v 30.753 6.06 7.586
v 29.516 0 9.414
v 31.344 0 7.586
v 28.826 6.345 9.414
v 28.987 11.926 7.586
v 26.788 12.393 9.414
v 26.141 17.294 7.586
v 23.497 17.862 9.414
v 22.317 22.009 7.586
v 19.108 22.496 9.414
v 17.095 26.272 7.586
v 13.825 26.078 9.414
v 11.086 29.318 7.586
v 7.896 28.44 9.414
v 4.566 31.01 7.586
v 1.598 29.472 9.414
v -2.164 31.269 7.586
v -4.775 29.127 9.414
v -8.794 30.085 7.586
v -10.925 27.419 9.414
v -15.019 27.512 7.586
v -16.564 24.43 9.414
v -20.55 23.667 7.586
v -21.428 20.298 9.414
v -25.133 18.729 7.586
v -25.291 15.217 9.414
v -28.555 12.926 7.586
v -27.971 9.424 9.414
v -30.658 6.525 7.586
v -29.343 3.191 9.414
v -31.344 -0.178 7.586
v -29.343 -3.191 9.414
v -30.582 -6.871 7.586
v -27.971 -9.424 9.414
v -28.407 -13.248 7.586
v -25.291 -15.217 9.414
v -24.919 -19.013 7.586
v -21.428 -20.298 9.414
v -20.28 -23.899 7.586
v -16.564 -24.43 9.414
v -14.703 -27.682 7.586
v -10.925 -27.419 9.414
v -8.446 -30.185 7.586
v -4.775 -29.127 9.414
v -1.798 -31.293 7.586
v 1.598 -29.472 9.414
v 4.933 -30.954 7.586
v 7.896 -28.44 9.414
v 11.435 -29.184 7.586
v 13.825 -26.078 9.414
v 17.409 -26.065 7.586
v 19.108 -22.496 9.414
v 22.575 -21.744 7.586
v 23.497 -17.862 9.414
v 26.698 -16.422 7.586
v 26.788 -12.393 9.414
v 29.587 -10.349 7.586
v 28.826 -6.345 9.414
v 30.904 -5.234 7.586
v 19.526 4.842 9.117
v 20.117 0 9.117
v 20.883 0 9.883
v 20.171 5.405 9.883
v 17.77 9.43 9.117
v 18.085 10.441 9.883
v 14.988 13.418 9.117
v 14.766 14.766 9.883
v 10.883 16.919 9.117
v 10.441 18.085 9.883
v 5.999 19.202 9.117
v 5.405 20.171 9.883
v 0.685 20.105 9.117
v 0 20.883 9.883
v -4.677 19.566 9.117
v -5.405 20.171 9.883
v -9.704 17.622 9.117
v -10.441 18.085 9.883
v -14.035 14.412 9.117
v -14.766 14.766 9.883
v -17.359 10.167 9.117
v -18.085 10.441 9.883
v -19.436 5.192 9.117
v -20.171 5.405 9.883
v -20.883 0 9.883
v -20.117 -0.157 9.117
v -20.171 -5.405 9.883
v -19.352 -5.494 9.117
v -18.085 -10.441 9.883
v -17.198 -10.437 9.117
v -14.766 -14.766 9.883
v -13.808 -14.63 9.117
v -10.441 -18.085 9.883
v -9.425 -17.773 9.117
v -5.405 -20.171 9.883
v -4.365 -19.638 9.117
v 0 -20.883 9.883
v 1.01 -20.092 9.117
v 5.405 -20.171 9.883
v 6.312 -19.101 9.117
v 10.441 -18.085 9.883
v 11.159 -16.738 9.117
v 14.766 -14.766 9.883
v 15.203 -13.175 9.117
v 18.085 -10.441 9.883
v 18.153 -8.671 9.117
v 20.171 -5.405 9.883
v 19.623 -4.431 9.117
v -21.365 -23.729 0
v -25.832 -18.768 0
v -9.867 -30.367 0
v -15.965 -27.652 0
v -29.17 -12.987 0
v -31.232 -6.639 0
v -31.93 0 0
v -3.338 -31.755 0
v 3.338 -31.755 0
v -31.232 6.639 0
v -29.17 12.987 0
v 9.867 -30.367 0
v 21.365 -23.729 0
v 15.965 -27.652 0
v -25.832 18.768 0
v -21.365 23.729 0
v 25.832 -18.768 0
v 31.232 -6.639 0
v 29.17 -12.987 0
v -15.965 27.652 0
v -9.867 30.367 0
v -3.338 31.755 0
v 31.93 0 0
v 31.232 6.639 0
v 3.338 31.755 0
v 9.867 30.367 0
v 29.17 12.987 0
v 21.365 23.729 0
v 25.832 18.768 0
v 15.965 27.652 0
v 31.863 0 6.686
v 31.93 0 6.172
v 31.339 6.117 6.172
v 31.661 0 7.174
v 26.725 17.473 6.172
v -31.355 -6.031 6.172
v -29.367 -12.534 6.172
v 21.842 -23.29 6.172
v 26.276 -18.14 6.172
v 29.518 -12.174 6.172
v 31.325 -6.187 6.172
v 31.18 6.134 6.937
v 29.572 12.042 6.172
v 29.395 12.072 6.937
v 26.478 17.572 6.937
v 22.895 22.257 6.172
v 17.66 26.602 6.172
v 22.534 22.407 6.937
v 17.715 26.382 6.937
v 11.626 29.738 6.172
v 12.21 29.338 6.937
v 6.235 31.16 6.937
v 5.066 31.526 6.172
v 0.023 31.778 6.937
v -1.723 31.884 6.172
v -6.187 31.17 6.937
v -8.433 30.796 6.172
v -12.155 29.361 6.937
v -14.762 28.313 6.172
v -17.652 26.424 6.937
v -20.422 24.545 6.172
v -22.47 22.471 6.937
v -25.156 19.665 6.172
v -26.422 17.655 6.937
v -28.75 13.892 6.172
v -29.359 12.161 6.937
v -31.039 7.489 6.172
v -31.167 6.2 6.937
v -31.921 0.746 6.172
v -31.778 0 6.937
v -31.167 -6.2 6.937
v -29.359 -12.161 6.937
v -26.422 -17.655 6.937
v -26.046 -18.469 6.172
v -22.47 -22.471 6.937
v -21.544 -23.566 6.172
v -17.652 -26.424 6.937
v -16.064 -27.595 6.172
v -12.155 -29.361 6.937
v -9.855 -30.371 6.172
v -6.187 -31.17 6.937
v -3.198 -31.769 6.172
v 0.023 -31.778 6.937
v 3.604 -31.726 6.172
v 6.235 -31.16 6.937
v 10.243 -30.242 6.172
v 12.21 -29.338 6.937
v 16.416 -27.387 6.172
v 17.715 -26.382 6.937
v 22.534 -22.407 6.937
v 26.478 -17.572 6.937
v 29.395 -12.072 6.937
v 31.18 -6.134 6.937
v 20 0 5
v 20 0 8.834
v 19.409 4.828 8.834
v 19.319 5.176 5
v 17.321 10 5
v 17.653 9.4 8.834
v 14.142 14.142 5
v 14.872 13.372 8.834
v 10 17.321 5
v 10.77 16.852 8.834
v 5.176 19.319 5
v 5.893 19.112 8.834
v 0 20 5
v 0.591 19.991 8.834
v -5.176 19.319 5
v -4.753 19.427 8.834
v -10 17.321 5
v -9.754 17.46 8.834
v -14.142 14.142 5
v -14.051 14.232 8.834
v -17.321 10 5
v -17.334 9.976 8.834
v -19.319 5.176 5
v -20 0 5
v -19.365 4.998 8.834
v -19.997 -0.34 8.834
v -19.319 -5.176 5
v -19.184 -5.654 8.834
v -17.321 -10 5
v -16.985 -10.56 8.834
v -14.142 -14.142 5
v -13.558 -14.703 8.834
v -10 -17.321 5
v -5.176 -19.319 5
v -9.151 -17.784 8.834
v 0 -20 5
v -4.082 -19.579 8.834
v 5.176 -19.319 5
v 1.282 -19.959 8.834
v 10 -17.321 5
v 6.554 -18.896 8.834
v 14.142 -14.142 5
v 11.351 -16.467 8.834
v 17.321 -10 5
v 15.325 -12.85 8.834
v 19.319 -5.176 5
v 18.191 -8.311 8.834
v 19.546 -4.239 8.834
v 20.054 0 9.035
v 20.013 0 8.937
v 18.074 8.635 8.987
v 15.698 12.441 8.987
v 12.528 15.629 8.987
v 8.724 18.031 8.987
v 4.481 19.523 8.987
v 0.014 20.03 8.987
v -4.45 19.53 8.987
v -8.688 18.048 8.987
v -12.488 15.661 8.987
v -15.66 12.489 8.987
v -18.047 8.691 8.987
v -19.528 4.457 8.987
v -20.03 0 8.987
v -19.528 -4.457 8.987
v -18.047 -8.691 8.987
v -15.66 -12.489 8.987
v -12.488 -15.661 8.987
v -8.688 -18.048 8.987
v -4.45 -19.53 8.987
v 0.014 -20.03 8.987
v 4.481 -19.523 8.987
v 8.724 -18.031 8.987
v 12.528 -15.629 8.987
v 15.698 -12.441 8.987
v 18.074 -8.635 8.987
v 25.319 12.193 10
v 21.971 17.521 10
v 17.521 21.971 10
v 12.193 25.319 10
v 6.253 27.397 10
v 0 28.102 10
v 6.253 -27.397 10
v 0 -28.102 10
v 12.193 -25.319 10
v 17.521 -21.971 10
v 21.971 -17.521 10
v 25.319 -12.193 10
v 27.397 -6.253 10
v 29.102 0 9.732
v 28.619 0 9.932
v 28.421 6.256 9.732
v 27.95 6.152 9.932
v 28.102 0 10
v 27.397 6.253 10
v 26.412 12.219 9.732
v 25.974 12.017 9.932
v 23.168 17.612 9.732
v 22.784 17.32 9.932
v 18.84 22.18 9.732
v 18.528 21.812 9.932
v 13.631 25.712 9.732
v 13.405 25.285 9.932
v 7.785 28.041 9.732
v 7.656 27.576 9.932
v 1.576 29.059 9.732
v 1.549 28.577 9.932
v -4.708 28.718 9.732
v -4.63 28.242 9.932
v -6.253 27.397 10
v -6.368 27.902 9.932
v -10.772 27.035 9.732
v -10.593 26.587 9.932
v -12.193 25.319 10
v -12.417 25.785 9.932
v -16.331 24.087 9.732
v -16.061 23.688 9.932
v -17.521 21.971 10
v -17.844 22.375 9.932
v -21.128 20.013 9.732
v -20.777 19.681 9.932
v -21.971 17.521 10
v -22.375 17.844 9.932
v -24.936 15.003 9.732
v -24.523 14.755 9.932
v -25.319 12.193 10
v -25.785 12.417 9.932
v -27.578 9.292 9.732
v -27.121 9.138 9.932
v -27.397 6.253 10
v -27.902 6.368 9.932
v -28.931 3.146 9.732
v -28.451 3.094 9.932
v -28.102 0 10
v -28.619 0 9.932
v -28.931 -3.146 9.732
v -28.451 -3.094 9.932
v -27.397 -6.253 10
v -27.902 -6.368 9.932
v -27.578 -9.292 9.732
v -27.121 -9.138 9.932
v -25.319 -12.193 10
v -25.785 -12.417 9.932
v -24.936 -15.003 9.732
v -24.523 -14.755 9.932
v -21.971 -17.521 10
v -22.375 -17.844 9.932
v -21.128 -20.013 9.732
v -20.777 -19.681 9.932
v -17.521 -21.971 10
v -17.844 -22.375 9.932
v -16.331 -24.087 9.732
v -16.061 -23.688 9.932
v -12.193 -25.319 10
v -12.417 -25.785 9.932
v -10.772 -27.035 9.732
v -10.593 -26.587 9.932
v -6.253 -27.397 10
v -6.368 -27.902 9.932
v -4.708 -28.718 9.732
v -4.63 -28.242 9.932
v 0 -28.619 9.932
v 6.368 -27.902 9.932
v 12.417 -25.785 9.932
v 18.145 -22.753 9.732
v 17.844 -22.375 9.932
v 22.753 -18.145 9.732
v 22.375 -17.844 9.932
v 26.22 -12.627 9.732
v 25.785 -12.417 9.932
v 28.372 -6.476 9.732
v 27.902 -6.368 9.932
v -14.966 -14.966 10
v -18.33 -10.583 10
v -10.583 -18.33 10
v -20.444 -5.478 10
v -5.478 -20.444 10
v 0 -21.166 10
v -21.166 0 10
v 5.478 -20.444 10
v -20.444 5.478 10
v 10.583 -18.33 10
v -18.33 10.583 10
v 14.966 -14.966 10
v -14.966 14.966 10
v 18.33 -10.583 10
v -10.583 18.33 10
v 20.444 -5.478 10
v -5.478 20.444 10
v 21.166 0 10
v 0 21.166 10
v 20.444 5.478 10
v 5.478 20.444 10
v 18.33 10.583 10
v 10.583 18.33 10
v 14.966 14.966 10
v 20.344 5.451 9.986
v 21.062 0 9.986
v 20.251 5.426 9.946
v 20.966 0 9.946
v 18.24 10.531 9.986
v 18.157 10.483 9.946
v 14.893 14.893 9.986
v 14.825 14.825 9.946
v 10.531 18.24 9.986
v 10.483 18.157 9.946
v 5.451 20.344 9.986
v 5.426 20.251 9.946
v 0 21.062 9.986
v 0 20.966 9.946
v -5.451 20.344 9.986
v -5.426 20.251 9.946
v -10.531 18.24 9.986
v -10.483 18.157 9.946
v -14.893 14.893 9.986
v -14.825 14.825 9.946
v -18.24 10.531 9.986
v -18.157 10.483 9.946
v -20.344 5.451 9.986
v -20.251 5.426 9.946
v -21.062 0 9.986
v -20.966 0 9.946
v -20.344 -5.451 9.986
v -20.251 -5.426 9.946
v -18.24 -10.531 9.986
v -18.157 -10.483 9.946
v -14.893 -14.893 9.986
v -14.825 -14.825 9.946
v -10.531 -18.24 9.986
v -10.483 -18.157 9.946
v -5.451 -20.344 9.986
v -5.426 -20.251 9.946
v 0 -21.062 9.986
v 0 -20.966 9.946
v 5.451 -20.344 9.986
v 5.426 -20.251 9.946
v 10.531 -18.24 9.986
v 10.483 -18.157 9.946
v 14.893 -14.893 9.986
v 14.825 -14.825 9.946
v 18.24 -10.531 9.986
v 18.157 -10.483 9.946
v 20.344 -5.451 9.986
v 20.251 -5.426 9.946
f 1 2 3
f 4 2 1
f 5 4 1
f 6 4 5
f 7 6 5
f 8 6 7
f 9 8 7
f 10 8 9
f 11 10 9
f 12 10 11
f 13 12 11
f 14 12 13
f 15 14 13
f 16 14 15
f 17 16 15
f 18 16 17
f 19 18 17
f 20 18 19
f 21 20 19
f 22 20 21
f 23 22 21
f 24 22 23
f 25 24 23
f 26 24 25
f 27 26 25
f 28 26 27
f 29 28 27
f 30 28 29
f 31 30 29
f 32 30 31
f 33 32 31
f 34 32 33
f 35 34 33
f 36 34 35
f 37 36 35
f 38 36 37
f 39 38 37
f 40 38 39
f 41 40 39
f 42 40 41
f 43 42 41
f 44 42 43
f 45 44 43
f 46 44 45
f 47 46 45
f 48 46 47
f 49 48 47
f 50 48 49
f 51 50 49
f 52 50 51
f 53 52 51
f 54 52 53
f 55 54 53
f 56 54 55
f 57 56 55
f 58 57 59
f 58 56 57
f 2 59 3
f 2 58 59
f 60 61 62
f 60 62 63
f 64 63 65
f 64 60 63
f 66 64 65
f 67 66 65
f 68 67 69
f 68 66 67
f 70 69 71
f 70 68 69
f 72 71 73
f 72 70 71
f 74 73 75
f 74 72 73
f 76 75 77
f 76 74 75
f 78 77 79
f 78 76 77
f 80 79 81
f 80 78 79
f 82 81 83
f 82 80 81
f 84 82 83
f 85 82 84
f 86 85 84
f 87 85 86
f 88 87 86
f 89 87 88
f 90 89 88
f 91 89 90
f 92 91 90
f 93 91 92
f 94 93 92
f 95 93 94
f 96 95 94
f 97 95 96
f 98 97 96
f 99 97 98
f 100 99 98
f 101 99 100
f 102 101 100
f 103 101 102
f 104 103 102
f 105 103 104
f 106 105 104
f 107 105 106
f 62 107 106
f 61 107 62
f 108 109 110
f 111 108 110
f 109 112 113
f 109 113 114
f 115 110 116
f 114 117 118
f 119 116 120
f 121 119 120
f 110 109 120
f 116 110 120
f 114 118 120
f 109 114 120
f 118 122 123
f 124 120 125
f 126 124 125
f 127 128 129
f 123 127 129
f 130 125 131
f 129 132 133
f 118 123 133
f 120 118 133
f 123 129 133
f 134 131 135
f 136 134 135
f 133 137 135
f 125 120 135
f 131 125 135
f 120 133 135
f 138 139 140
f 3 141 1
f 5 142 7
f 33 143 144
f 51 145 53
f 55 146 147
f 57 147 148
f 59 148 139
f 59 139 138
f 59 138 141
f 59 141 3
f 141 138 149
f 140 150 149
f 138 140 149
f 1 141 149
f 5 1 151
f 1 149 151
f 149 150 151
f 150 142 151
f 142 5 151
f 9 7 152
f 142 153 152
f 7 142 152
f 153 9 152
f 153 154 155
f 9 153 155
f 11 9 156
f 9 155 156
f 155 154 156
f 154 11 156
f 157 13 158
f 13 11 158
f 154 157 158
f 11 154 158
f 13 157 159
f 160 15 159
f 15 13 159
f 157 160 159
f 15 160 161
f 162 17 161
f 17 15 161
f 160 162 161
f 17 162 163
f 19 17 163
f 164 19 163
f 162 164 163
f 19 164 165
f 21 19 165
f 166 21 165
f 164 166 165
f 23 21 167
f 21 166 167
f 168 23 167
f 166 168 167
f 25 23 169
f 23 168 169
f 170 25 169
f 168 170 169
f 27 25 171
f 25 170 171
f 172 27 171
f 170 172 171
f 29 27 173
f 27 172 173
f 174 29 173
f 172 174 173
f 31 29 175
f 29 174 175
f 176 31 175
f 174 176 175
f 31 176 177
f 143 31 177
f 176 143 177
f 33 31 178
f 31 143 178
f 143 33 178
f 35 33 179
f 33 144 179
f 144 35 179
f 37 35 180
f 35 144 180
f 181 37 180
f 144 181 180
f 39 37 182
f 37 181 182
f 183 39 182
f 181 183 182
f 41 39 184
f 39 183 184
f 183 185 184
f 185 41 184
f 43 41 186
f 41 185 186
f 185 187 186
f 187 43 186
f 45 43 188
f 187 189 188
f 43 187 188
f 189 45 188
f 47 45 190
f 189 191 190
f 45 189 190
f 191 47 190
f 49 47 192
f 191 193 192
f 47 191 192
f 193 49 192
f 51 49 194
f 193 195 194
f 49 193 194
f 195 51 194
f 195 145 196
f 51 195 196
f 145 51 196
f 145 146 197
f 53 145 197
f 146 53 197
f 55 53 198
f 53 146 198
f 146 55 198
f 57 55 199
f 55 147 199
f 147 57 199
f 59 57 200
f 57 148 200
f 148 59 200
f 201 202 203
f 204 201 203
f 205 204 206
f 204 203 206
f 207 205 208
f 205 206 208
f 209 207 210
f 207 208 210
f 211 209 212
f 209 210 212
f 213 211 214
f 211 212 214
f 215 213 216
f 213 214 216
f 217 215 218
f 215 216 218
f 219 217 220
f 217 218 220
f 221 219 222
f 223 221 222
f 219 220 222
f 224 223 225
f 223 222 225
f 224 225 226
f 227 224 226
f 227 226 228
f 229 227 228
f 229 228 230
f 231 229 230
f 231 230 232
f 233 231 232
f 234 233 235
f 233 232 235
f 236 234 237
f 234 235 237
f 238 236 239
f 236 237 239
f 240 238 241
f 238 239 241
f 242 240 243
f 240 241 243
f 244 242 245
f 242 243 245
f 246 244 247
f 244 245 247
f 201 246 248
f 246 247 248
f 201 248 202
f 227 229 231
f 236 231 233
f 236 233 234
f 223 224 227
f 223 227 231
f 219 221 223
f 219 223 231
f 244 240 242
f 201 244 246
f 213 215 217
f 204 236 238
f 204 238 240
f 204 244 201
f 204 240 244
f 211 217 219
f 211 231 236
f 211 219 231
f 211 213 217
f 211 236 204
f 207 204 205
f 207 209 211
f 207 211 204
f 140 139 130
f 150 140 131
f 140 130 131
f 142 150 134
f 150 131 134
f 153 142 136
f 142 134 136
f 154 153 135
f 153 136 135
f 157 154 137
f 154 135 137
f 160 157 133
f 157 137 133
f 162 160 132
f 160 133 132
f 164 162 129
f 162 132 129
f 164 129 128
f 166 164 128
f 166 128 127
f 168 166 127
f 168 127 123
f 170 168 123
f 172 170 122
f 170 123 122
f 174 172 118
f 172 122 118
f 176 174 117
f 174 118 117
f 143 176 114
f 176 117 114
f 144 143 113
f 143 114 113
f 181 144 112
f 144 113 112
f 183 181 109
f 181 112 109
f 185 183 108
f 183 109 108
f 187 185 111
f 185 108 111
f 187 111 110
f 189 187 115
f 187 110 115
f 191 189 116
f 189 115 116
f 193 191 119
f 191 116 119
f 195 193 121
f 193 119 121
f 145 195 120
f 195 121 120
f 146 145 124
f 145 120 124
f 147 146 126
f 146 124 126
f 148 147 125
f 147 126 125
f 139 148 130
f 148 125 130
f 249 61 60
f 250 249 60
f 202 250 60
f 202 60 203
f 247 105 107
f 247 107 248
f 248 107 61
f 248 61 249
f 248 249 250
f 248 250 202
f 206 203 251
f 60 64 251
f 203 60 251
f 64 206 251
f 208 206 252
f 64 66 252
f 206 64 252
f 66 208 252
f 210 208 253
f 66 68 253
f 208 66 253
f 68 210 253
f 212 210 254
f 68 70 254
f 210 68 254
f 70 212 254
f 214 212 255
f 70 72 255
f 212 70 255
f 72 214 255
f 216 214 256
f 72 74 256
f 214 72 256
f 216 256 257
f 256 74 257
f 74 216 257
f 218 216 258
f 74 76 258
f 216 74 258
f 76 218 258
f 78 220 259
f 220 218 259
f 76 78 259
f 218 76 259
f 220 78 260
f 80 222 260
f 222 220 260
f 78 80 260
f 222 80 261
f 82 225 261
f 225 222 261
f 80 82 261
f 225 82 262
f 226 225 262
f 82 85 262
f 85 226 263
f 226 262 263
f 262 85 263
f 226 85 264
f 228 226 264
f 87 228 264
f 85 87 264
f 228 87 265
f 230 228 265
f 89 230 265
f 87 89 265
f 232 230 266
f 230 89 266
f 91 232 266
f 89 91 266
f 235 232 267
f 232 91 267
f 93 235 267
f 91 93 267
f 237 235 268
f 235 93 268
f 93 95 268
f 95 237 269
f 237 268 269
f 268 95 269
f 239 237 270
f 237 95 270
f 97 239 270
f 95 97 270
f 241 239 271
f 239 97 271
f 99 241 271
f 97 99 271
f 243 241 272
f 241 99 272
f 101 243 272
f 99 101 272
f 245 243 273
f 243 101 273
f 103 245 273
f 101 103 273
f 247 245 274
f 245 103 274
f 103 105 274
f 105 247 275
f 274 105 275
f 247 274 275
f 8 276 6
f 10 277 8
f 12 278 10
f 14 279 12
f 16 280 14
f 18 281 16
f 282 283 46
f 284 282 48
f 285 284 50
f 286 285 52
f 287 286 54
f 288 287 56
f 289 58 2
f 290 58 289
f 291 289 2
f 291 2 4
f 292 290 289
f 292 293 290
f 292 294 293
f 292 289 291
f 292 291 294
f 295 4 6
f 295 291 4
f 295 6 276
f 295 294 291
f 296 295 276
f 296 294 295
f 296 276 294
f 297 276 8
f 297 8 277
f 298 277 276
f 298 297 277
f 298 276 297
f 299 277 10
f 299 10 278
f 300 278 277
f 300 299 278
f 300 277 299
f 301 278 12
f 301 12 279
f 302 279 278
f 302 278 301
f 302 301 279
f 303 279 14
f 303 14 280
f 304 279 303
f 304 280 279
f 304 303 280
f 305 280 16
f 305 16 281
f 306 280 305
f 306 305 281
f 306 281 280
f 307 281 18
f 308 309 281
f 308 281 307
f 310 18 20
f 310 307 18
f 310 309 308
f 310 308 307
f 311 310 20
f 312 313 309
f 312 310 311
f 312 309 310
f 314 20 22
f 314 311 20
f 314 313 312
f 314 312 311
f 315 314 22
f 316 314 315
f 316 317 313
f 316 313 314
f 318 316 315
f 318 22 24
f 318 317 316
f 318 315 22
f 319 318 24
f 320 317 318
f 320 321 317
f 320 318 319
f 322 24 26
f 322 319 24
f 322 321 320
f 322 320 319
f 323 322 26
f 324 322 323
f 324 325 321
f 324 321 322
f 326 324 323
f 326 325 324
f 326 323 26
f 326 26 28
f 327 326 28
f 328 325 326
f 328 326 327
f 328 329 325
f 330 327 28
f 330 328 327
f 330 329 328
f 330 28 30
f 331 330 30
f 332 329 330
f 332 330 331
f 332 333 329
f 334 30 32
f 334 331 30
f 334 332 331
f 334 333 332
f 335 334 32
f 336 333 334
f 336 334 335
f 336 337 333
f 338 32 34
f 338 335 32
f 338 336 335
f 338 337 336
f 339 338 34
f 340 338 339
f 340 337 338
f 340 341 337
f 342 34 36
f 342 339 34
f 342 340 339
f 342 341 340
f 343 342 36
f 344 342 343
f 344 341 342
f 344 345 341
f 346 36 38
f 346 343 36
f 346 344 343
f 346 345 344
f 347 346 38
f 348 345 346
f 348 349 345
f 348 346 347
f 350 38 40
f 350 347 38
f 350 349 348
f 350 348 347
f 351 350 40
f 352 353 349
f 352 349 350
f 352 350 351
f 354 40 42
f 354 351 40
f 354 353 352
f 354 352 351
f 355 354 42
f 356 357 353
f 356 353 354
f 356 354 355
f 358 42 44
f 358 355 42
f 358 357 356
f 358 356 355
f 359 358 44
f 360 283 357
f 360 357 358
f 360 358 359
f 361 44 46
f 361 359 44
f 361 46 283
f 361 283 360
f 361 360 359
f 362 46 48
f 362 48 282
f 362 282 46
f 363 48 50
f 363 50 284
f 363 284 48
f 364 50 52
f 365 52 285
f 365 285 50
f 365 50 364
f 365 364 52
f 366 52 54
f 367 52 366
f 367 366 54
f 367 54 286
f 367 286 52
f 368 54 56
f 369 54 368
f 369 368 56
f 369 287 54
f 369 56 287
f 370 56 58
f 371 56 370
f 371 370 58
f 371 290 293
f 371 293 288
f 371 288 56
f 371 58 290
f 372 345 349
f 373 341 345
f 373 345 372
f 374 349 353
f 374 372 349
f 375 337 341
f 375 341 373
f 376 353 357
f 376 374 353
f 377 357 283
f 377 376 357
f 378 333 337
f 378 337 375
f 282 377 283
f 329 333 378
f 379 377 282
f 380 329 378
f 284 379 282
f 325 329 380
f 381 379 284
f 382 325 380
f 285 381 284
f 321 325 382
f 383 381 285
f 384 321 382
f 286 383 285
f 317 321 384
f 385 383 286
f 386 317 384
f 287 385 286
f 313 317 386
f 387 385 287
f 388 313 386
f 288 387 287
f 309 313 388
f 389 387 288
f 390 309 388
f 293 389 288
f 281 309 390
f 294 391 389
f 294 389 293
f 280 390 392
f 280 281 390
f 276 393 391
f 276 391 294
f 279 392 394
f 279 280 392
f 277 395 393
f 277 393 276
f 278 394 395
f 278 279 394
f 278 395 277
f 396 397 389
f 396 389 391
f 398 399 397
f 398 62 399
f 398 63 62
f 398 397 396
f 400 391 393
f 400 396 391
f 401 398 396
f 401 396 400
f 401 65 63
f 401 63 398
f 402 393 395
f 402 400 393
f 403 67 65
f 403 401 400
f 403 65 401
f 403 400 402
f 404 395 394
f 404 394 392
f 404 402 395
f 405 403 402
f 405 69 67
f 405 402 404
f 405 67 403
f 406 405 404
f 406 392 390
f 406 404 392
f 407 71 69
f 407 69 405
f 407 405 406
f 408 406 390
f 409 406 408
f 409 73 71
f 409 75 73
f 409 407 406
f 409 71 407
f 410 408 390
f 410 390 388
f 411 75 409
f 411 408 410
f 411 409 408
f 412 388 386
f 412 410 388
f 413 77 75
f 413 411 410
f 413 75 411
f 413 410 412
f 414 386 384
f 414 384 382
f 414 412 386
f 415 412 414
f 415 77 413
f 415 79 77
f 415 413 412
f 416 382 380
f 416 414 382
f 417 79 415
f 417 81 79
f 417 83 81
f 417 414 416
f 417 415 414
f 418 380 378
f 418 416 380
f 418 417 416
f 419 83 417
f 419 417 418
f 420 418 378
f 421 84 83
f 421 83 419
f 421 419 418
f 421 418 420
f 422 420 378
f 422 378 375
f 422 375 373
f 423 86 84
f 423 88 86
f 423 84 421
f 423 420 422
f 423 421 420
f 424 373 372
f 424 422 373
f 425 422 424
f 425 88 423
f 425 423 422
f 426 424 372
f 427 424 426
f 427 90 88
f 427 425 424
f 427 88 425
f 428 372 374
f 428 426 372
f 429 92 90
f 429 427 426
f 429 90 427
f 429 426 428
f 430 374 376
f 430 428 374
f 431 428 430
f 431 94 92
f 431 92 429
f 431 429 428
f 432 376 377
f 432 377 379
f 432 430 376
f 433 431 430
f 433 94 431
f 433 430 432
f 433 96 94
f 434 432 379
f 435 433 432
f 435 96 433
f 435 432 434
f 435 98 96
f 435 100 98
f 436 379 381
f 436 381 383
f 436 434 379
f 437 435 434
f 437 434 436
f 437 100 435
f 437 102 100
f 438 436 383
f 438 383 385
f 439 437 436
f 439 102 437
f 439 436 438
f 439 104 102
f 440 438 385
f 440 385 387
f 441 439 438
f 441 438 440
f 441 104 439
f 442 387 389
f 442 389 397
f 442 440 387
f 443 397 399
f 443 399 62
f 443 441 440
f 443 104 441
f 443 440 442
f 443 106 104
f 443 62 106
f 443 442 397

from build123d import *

# Parameters (mm, degrees)
SKETCH1_R           = 31.93
BOSS_EXTRUDE1_DEPTH = 10
CHAMFER1_SIZE       = 3
FILLET1_R           = 2
SKETCH2_R           = 20
CUT_EXTRUDE1_DEPTH  = 5
CHAMFER2_SIZE       = 1
FILLET2_R           = 0.4


with BuildPart() as part:
    # Sketch1 → Boss-Extrude1 (new body)
    with BuildSketch(Plane.XY):
        Circle(SKETCH1_R)
    extrude(amount=BOSS_EXTRUDE1_DEPTH)

    # Chamfer1
    chamfer1_edges = [part.edges().sort_by_distance(p)[0] for p in [
        (-31.93, 0, 10),
    ]]
    chamfer(chamfer1_edges, length=CHAMFER1_SIZE)

    # Fillet1
    fillet1_edges = [part.edges().sort_by_distance(p)[0] for p in [
        (-28.93, 0, 10),
        (-31.93, 0, 7),
    ]]
    fillet(fillet1_edges, radius=FILLET1_R)

    # Sketch2 → Cut-Extrude1 (cut)
    with BuildSketch(Plane.XY.offset(10)):
        Circle(SKETCH2_R)
    extrude(amount=-CUT_EXTRUDE1_DEPTH, mode=Mode.SUBTRACT)

    # Chamfer2
    chamfer2_edges = [part.edges().sort_by_distance(p)[0] for p in [
        (-20, 0, 10),
    ]]
    chamfer(chamfer2_edges, length=CHAMFER2_SIZE)

    # Fillet2
    fillet2_edges = [part.edges().sort_by_distance(p)[0] for p in [
        (-20, 0, 9),
        (-21, 0, 10),
    ]]
    fillet(fillet2_edges, radius=FILLET2_R)


solid = part.part
